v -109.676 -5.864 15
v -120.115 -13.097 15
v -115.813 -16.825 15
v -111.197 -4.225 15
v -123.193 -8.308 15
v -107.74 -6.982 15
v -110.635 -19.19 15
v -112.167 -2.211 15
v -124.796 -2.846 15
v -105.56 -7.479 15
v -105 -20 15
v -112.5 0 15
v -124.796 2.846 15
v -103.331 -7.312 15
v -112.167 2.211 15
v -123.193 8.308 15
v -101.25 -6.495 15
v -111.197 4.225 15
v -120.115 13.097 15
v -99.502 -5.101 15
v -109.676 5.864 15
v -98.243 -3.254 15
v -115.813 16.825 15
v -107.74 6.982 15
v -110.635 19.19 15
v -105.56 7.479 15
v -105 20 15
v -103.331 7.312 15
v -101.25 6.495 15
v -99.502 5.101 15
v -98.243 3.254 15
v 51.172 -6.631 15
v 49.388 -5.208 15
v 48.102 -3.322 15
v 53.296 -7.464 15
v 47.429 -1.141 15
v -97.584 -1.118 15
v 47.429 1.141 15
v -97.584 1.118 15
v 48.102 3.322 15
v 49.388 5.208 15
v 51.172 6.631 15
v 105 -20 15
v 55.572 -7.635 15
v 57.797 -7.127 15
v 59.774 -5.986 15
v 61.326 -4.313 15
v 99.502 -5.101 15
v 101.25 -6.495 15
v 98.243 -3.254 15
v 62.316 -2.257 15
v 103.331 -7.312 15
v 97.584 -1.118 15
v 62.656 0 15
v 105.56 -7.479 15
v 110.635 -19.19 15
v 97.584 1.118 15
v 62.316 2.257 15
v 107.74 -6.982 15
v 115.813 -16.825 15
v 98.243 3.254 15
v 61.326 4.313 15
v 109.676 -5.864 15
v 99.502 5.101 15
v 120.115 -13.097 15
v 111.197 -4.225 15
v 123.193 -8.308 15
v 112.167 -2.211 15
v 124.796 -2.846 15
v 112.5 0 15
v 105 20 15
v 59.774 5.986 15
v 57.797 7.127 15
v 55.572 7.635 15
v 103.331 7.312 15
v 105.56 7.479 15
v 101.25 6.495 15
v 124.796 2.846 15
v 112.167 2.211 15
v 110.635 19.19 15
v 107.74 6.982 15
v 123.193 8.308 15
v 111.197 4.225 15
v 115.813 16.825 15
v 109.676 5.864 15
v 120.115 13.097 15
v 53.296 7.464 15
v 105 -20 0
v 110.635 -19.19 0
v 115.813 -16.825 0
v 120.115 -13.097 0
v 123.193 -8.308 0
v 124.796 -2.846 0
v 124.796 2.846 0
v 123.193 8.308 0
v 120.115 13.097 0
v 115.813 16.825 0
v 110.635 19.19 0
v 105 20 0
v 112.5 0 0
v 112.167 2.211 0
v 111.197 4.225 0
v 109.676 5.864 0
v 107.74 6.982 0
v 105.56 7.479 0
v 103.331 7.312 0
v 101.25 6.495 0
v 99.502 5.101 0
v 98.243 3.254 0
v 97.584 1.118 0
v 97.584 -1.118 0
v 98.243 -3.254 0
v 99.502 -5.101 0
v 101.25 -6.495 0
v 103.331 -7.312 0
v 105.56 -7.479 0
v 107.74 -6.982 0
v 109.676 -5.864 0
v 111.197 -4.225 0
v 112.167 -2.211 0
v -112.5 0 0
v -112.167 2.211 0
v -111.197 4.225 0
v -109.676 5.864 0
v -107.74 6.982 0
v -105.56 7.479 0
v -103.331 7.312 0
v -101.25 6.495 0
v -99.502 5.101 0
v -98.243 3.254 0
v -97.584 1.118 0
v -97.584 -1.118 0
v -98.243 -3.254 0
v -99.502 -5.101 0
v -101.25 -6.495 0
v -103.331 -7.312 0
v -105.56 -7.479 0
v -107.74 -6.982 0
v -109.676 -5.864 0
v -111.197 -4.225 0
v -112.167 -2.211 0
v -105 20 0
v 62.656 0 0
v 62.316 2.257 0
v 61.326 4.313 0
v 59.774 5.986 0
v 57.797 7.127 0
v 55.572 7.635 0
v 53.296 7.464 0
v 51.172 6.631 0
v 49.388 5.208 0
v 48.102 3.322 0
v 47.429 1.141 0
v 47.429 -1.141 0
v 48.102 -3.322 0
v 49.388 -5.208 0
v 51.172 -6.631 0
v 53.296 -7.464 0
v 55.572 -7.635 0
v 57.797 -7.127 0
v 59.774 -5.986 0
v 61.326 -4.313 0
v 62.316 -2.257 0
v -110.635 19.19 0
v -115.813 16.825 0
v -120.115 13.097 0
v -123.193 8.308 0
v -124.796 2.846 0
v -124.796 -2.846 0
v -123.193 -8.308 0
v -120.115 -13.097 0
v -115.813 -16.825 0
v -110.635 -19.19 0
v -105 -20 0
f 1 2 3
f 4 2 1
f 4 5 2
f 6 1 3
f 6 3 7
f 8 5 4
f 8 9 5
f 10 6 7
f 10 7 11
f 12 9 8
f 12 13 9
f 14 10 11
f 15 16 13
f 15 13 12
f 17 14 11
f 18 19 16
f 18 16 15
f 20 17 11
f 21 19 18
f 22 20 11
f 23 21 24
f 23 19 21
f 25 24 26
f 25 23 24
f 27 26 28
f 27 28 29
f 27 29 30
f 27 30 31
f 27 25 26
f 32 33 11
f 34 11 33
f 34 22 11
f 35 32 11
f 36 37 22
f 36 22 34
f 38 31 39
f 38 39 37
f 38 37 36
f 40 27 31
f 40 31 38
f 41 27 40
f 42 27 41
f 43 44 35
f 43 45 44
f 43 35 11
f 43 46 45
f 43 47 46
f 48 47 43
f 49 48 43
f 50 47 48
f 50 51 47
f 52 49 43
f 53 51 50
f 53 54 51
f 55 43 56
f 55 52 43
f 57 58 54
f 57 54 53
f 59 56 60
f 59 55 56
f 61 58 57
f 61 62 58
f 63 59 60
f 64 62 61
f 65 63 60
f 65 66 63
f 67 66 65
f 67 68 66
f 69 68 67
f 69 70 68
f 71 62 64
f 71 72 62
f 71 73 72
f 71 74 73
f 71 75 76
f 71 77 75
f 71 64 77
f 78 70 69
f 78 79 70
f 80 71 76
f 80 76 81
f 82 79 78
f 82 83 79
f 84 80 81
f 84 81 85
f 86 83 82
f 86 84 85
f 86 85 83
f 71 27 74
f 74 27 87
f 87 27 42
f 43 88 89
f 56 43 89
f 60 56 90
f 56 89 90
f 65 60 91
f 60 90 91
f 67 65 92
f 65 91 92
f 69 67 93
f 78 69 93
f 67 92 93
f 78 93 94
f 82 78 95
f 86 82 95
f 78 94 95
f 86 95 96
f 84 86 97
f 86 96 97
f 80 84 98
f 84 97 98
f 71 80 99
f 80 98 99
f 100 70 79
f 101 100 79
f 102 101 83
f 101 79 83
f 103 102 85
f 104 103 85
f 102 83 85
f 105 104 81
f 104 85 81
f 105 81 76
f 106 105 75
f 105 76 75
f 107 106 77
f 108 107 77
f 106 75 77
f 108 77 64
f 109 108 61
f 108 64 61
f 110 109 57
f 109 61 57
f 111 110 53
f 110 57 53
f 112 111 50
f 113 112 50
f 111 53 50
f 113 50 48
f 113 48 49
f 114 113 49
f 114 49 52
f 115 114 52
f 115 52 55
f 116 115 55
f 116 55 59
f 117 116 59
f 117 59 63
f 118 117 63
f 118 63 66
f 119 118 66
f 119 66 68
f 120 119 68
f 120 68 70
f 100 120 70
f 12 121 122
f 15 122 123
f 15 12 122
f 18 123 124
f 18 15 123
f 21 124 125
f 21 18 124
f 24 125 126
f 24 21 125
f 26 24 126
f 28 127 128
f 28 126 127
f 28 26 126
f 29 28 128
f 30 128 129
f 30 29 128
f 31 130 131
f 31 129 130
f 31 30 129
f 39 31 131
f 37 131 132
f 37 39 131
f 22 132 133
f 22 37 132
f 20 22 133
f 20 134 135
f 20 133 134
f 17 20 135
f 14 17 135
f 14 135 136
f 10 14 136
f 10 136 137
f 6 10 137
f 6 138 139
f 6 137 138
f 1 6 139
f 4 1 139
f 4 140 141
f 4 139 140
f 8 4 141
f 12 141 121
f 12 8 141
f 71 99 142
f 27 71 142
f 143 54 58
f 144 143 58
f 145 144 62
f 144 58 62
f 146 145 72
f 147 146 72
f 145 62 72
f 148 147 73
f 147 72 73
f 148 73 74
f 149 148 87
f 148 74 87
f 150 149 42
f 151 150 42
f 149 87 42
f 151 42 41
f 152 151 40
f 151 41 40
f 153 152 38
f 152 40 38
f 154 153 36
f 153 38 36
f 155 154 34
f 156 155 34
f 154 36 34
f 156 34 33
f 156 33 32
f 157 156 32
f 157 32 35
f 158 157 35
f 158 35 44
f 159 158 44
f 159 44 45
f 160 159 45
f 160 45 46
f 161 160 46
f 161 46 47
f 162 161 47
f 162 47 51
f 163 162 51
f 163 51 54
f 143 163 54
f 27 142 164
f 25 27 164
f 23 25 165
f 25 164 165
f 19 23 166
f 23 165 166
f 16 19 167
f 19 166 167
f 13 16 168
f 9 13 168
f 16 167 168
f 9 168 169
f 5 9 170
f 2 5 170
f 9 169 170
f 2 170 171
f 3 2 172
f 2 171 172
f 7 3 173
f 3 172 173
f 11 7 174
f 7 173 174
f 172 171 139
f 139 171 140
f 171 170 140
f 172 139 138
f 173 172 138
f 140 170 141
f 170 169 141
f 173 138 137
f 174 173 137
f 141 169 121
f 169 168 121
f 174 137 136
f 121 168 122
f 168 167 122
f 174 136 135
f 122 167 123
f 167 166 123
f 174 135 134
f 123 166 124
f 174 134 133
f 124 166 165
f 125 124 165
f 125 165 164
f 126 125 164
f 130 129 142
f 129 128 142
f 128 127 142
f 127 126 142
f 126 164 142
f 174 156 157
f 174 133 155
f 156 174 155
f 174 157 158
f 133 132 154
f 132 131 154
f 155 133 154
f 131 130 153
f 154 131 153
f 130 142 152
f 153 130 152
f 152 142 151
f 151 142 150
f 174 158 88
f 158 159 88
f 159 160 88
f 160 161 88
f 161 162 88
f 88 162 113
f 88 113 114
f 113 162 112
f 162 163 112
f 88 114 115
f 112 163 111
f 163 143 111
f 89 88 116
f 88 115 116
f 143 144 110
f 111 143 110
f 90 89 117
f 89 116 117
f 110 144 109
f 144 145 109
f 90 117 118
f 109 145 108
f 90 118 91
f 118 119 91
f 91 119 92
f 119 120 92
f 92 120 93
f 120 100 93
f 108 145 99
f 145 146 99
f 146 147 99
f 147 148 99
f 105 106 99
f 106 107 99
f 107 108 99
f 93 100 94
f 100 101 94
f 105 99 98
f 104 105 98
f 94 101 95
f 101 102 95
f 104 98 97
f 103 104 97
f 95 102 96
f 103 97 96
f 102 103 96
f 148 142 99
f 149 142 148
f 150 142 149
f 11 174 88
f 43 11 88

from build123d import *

# Parameters (mm, degrees)
BOSS_EXTRUDE1_DEPTH = 15
SKETCH4_R           = 7.5
CUT_EXTRUDE1_DEPTH  = 128.47548784
SKETCH5_R           = 7.656287761
CUT_EXTRUDE2_DEPTH  = 128.47548784


with BuildPart() as part:
    # Sketch1 → Boss-Extrude1 (new body)
    with BuildSketch(Plane.XY):
        with BuildLine():
            Line((-105, -20), (105, -20))
            ThreePointArc((105, -20), (125, 0), (105, 20))
            Line((105, 20), (-105, 20))
            ThreePointArc((-105, 20), (-125, 0), (-105, -20))
        make_face()
    extrude(amount=BOSS_EXTRUDE1_DEPTH)

    # Sketch4 → Cut-Extrude1 (cut, through all)
    with BuildSketch(Plane.XY.offset(15)):
        with Locations((105, 0)):
            Circle(SKETCH4_R)
    cut_extrude1 = extrude(amount=-CUT_EXTRUDE1_DEPTH, mode=Mode.SUBTRACT)

    # Mirror1: Cut-Extrude1 across plane
    add(cut_extrude1.mirror(Plane(origin=(0, 0, 0), x_dir=(0, 0, 1), z_dir=(1, 0, 0))), mode=Mode.SUBTRACT)

    # Sketch5 → Cut-Extrude2 (cut, through all)
    with BuildSketch(Plane.XY.offset(15)):
        with Locations((55, 0)):
            Circle(SKETCH5_R)
    extrude(amount=-CUT_EXTRUDE2_DEPTH, mode=Mode.SUBTRACT)


solid = part.part
